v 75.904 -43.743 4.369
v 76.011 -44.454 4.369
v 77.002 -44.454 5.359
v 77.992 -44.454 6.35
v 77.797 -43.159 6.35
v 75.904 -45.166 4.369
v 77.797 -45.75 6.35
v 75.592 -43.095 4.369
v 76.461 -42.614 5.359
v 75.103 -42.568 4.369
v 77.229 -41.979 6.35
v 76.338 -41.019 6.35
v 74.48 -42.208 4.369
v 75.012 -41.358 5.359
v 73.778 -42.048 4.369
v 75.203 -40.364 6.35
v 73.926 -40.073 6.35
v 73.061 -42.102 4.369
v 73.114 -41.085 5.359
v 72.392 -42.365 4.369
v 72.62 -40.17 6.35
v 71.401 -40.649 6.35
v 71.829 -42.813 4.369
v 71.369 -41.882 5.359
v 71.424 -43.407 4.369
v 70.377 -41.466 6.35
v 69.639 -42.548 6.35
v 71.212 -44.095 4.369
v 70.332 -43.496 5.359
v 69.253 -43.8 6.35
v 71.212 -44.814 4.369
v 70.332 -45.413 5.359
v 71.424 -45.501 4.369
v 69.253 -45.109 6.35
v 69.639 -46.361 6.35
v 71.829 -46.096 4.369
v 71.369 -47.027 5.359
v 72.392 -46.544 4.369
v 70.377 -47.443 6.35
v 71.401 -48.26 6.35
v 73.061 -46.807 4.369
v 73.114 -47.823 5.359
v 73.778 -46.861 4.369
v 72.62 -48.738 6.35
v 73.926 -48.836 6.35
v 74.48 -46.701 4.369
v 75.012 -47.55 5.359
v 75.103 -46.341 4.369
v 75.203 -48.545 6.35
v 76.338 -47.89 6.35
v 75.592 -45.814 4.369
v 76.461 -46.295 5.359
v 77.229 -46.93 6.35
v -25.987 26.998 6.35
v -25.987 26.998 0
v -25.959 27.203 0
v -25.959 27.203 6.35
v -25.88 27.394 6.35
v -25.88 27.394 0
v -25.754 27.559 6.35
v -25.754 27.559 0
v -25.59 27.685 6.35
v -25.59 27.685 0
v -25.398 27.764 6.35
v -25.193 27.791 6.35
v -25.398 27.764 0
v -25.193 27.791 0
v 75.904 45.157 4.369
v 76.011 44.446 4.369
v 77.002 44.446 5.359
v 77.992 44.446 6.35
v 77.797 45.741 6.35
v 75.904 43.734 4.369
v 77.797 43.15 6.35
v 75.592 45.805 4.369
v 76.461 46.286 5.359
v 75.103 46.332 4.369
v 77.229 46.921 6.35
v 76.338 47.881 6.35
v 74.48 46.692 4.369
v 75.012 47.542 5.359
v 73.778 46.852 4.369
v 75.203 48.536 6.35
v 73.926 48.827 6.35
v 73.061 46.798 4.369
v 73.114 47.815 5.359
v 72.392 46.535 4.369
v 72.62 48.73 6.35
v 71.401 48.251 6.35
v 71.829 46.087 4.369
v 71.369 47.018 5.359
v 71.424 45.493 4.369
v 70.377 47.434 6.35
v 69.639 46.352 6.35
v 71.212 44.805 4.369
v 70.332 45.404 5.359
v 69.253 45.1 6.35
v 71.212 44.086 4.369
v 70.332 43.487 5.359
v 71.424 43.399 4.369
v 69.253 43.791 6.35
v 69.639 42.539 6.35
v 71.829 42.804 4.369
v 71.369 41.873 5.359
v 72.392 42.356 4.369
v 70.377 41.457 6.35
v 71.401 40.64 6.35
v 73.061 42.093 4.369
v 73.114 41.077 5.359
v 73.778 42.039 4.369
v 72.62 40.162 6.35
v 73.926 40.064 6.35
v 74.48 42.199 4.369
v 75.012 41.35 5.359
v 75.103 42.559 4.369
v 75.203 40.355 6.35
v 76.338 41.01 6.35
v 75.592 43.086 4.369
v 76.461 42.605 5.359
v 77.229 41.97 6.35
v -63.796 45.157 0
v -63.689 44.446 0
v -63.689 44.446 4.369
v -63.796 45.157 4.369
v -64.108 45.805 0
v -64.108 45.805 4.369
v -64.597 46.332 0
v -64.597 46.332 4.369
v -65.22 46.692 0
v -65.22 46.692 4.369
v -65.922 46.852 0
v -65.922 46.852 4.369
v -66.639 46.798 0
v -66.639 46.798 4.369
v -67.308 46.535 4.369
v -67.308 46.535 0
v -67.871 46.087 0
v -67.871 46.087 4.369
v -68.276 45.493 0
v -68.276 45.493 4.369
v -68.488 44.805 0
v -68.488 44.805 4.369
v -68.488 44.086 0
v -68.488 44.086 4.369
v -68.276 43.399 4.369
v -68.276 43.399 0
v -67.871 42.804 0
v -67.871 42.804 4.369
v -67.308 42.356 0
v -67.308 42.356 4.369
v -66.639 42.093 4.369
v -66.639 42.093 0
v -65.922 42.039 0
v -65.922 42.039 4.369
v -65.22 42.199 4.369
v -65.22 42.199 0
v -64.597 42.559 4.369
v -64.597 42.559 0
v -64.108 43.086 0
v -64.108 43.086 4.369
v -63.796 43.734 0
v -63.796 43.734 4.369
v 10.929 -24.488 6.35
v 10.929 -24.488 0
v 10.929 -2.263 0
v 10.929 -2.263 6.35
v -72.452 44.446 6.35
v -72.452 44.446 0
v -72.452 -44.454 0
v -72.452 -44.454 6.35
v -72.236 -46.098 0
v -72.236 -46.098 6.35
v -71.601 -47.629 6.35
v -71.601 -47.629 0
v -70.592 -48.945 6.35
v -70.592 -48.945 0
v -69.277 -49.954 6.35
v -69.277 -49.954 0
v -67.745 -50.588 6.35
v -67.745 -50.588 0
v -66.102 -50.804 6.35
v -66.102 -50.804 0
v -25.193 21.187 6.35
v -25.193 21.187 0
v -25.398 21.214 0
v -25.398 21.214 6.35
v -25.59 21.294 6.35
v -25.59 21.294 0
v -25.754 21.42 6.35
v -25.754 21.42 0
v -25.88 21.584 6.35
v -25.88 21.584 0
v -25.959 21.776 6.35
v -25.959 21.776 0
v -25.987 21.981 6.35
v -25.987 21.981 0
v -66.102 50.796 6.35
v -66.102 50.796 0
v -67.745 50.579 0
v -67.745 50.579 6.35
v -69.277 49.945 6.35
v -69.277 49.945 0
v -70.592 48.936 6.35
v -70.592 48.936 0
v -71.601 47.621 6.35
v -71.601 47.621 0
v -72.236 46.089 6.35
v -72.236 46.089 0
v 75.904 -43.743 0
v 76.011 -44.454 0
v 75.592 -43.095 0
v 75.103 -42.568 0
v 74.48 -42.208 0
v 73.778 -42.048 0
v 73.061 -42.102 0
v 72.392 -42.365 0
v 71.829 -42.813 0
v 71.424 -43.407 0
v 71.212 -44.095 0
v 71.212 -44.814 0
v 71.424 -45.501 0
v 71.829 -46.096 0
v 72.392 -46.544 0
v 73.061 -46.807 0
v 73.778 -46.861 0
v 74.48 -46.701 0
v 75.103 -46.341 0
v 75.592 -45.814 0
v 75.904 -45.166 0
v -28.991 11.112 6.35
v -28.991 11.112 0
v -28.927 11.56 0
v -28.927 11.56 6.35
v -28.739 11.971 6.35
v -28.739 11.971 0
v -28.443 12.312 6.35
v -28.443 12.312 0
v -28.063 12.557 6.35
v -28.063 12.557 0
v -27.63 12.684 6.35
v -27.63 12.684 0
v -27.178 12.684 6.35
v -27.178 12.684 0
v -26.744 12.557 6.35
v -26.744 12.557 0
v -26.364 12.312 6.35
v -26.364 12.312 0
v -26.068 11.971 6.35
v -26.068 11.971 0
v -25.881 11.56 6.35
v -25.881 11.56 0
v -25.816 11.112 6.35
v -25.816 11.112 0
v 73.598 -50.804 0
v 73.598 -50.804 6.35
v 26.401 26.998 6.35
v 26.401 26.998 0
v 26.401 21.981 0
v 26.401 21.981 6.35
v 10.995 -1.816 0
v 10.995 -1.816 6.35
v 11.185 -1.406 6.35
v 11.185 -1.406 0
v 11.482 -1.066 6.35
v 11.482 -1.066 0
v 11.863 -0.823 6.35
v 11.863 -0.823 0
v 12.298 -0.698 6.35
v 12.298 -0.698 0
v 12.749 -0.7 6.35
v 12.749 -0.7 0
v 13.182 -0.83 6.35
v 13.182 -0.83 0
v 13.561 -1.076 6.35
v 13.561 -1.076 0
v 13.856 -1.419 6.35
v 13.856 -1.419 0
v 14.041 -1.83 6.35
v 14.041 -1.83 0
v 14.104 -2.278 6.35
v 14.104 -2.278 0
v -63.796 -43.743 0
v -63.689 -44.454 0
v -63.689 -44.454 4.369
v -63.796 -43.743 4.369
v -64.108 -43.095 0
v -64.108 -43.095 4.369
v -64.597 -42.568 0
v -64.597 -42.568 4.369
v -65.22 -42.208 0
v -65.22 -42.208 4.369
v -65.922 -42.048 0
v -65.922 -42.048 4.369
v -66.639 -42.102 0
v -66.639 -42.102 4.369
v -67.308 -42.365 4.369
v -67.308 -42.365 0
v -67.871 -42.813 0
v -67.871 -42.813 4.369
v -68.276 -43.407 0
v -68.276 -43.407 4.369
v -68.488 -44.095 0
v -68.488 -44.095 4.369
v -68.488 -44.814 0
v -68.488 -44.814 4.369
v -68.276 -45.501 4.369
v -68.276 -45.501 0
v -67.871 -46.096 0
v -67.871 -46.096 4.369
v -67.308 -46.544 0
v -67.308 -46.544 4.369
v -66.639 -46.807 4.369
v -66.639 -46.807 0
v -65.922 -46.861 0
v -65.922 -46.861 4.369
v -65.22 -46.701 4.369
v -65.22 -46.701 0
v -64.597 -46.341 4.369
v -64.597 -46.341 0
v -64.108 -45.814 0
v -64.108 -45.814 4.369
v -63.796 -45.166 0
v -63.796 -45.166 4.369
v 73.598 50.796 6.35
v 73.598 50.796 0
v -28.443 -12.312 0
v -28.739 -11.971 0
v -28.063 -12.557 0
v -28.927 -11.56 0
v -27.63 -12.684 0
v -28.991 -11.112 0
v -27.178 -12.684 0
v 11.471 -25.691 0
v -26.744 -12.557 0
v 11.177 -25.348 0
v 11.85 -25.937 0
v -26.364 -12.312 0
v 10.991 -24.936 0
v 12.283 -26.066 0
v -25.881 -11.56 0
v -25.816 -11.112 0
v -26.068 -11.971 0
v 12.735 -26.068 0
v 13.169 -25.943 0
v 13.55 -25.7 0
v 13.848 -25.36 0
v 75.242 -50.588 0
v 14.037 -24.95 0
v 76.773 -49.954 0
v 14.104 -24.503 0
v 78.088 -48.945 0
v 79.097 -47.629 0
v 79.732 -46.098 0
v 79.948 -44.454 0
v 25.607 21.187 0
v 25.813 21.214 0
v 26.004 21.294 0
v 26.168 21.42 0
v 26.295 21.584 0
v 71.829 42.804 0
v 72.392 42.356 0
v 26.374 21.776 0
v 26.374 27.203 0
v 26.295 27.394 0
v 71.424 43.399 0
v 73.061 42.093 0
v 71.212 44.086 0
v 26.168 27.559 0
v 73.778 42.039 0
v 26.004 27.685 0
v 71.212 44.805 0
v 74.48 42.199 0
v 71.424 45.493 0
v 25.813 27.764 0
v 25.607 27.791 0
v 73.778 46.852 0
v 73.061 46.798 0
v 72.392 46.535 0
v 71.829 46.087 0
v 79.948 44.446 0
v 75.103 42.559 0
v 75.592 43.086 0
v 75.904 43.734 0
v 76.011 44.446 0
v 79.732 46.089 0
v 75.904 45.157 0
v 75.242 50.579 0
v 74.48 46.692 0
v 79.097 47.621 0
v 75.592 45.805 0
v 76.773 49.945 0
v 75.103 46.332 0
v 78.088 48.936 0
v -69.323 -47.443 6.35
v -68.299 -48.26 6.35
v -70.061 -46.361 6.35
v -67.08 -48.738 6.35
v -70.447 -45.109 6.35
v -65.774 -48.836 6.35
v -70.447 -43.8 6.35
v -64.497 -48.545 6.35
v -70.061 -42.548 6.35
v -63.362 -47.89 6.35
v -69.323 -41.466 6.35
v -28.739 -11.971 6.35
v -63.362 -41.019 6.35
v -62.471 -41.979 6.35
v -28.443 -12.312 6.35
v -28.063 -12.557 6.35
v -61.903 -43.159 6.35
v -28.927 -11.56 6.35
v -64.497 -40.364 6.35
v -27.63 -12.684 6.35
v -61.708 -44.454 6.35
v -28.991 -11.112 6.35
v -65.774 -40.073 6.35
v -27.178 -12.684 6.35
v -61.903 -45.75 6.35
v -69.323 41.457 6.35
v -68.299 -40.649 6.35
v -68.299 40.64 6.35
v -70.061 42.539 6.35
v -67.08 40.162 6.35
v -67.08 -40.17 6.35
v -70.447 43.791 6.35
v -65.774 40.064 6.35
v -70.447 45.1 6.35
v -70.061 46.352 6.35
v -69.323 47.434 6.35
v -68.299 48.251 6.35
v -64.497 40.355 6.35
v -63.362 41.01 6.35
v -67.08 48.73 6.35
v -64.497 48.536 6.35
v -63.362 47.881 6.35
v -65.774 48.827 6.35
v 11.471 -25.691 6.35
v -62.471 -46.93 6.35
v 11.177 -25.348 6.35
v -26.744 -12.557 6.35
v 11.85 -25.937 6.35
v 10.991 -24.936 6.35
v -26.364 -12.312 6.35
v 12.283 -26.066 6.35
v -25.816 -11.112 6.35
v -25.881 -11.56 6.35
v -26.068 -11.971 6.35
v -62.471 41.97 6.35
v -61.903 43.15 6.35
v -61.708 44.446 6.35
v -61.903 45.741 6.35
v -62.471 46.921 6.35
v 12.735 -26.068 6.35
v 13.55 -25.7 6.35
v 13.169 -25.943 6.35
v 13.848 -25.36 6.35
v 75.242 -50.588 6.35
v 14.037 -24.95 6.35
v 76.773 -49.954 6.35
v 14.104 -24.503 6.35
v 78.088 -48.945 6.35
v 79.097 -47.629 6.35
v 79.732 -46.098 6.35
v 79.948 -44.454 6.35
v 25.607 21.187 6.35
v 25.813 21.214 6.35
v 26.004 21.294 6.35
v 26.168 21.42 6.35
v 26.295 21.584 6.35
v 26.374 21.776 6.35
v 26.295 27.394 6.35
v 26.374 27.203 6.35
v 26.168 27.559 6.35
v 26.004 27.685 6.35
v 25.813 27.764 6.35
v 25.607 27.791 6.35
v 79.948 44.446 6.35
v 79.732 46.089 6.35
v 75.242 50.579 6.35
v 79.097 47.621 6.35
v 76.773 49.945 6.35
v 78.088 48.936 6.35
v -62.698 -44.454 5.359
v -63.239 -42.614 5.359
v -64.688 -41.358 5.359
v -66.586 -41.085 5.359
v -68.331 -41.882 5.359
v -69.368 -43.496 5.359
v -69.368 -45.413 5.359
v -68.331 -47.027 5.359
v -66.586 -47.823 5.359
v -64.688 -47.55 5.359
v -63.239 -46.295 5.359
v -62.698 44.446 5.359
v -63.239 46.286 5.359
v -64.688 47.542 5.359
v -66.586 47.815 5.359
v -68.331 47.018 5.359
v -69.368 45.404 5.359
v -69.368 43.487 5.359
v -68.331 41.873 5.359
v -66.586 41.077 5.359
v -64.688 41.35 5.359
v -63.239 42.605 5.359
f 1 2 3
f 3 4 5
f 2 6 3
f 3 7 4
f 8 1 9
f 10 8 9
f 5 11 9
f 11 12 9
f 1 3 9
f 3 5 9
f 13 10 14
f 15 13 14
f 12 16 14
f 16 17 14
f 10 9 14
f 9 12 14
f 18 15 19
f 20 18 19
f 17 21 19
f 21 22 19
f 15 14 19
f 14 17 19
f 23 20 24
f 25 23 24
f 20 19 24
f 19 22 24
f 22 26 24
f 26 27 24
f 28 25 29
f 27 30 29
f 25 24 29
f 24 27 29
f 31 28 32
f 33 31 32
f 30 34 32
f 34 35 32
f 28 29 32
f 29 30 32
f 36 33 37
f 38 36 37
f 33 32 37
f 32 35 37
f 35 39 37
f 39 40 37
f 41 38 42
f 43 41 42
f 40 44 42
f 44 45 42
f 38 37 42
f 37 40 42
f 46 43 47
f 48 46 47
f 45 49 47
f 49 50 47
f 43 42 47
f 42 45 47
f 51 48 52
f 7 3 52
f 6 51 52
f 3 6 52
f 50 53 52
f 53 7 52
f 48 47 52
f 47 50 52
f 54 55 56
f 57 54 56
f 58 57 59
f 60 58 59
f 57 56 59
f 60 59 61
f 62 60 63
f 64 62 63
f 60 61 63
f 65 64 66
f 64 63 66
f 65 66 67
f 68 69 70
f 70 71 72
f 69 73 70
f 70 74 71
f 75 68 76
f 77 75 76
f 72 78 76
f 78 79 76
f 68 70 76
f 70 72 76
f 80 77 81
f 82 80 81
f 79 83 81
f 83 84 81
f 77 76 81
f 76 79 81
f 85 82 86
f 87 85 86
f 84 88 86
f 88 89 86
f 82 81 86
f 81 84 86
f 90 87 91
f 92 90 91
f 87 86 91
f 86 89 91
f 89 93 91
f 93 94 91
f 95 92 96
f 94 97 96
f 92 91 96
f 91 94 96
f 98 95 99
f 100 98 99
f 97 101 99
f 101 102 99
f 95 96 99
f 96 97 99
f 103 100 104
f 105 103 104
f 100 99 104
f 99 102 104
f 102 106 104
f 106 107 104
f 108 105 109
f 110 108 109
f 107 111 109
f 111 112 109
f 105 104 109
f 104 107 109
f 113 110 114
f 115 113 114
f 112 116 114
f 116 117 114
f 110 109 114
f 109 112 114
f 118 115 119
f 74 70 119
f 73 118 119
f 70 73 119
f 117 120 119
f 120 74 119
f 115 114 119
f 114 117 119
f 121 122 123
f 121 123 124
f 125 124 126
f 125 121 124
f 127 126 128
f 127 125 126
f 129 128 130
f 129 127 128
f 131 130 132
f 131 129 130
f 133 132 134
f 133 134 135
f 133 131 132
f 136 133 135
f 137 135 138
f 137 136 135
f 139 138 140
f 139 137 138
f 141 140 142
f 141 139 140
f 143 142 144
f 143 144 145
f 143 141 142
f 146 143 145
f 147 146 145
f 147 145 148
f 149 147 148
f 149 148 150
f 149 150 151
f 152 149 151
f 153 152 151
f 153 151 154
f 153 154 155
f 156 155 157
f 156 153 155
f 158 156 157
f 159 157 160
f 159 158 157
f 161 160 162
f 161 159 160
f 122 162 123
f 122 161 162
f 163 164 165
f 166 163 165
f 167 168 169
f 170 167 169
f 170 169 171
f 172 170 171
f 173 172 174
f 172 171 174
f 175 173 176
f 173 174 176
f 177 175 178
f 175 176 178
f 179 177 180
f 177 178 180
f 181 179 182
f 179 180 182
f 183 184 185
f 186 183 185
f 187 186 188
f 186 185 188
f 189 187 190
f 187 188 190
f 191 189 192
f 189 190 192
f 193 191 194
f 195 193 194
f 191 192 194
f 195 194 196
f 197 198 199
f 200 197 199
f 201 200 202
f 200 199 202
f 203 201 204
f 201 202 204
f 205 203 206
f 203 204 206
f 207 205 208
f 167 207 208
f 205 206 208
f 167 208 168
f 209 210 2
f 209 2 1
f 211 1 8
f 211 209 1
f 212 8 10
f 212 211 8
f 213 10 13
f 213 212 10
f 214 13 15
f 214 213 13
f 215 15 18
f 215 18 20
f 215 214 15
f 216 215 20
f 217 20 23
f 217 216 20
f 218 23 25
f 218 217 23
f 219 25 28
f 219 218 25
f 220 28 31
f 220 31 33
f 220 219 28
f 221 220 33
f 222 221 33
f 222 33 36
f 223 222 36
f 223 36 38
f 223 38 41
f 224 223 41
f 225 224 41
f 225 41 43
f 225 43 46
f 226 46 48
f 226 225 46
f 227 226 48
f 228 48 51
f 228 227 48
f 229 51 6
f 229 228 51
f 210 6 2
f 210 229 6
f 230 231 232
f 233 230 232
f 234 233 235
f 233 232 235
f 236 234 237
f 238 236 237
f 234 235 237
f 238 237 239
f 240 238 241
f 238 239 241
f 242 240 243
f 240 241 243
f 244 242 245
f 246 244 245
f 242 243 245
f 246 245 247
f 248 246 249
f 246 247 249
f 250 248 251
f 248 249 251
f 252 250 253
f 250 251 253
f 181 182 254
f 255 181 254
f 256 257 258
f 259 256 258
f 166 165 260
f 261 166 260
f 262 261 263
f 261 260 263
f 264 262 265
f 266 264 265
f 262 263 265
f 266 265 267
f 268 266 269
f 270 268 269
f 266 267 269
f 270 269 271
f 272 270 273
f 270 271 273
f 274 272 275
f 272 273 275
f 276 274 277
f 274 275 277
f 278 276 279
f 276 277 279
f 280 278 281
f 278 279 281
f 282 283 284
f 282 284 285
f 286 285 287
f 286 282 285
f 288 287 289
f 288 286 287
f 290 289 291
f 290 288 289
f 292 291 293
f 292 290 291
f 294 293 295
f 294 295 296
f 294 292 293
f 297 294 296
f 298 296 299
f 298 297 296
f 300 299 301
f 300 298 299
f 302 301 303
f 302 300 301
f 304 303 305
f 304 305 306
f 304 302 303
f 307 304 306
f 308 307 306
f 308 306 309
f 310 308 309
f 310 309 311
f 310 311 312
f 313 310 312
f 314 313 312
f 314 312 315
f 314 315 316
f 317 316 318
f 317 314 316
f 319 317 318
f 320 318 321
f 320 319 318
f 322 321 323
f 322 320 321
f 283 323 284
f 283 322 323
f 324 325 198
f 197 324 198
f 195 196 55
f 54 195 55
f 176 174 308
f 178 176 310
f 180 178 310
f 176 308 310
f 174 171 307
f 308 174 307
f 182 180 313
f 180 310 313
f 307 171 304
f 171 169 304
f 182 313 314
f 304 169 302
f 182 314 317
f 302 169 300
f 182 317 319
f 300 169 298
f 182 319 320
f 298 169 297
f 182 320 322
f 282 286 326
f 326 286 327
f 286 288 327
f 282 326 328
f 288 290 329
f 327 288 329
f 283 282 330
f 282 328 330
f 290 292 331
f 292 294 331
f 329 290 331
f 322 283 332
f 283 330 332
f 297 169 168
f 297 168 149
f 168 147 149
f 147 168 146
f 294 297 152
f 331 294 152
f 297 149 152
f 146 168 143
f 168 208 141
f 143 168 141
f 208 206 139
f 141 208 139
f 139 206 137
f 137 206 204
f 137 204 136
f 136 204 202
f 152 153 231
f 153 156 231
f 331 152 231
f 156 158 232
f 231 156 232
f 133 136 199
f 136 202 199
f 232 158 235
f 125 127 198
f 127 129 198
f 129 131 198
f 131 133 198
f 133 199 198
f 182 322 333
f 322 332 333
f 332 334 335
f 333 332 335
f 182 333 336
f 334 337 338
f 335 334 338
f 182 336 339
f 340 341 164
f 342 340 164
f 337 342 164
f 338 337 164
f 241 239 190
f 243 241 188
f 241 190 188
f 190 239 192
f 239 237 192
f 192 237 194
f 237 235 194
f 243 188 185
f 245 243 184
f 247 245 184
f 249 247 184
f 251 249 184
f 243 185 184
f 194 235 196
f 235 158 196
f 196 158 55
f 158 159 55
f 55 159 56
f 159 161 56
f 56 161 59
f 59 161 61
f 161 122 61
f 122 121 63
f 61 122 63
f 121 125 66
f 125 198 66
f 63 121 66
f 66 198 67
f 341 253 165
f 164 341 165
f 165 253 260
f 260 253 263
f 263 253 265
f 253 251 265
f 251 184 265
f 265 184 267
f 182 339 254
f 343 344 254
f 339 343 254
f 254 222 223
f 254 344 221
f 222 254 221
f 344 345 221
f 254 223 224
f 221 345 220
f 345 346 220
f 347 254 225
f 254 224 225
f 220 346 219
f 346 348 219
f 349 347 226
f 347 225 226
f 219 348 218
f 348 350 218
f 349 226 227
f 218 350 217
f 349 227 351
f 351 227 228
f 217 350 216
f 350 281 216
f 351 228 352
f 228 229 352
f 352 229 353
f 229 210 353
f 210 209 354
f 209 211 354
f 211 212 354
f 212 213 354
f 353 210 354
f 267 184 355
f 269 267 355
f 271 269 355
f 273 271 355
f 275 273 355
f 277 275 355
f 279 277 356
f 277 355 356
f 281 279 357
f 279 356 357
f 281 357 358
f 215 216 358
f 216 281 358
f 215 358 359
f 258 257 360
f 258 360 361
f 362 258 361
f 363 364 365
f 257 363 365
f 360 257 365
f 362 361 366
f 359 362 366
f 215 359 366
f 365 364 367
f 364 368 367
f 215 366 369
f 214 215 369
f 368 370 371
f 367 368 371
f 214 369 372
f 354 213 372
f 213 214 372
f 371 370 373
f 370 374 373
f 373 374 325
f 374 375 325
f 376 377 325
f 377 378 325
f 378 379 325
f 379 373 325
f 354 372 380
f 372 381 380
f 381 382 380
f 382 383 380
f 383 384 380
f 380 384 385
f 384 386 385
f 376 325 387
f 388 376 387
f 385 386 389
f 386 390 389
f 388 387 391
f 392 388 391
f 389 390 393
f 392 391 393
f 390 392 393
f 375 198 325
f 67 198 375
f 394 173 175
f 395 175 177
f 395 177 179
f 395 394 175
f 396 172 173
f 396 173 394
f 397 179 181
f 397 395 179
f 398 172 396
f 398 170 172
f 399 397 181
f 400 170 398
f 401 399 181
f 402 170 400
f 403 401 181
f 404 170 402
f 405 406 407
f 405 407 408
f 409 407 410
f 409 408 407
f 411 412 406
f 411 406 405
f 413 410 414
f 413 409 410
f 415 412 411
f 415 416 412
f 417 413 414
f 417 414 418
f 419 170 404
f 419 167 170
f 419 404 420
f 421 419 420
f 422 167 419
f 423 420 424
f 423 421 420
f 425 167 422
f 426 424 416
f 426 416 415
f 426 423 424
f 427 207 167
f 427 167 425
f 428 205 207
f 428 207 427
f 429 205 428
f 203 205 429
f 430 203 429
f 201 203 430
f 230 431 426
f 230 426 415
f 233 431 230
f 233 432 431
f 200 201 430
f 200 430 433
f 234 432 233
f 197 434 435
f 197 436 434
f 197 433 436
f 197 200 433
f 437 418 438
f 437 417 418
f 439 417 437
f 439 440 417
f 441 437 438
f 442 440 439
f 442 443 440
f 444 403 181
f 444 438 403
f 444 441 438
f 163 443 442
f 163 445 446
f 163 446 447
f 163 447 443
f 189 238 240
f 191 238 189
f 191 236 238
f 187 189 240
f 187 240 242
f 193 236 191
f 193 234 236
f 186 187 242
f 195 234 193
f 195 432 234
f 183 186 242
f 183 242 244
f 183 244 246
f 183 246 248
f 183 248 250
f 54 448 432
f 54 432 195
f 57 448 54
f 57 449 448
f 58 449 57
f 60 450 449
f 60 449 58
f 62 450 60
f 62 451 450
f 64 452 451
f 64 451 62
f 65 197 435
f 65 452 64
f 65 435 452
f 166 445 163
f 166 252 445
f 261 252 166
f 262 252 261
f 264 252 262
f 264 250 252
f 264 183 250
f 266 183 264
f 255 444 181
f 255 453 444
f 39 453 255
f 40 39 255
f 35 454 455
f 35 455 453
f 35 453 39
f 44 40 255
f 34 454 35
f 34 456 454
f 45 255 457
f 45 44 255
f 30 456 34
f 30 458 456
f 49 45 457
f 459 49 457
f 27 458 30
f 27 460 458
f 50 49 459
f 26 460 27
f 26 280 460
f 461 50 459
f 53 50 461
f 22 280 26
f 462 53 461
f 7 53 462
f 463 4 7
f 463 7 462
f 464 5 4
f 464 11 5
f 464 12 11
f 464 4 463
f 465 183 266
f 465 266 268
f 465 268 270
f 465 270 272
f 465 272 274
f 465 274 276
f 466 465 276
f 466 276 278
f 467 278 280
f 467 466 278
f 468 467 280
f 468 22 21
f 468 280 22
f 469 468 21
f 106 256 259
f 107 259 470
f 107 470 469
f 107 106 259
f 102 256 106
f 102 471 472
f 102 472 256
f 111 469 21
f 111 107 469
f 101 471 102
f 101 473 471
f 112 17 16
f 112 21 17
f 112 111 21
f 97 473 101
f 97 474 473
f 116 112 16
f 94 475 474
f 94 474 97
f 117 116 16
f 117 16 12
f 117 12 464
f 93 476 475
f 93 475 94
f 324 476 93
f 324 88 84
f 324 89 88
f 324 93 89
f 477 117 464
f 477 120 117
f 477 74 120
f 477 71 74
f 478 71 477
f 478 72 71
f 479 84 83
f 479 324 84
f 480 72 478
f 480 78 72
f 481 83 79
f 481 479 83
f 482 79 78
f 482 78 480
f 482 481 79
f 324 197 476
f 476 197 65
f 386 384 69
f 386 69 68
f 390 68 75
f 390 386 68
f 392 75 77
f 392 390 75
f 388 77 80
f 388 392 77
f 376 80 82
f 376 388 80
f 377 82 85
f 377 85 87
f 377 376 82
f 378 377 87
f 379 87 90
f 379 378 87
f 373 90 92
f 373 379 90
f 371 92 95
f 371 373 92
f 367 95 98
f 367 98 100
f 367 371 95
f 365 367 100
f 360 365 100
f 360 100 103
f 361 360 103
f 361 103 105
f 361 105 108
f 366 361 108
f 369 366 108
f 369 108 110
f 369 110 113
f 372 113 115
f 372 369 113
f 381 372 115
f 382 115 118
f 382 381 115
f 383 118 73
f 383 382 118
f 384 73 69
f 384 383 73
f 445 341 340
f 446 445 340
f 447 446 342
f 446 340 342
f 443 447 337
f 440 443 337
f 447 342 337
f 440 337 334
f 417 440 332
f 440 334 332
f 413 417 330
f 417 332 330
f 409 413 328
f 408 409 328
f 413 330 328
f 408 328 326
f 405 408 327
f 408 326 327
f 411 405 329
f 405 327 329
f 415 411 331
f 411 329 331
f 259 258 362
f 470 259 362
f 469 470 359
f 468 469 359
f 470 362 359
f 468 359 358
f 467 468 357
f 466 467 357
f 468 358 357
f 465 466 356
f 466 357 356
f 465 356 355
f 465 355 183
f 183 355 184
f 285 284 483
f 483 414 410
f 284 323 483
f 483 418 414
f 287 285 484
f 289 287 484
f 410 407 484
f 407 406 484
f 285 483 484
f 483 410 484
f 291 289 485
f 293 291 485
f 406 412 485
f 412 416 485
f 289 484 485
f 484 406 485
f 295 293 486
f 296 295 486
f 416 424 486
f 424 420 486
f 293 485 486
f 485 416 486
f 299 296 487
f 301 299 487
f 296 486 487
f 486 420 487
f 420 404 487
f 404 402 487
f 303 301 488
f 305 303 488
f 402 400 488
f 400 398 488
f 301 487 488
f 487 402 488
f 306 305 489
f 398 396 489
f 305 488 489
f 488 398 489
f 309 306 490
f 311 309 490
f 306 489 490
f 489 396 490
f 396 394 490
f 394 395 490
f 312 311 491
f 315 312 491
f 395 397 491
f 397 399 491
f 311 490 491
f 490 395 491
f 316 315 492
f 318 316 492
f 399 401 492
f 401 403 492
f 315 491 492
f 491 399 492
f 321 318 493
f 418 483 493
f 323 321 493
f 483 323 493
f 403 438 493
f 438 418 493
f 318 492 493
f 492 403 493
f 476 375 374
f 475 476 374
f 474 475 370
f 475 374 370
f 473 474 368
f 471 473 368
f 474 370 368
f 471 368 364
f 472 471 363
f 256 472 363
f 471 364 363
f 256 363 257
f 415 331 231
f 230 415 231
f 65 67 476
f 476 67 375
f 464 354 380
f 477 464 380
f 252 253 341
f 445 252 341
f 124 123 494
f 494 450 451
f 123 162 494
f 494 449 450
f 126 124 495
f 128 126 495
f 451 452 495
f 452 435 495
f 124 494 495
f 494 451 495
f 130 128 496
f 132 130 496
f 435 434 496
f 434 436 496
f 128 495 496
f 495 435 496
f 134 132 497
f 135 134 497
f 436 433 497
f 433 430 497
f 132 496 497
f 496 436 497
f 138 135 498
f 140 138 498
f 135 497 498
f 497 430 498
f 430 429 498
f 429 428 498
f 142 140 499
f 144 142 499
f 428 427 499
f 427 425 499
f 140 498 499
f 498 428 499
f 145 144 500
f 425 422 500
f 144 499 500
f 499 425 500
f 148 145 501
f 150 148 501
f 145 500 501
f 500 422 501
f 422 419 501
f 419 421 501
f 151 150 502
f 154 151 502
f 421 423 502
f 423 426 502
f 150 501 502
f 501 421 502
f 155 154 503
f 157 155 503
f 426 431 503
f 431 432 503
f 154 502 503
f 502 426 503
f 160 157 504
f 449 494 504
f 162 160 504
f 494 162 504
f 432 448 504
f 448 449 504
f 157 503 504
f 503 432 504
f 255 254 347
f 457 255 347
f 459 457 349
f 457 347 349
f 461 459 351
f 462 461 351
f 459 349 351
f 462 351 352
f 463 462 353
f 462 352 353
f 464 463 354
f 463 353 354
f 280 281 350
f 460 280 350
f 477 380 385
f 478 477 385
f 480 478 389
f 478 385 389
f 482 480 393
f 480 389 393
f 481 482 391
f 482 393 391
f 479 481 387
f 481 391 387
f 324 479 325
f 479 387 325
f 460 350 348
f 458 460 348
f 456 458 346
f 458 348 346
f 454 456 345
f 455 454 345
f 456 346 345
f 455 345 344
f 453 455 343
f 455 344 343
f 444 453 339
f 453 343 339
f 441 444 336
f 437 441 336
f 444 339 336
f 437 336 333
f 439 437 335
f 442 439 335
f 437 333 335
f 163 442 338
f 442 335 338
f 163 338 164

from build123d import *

# Parameters (mm, degrees)
F0_R     = 2.413
F1_DEPTH = 6.35
F2_SIZE  = 1.9812


with BuildPart() as f1:
    # F0 (on Top) → F1 (new body)
    with BuildSketch(Plane.XY):
        with BuildLine():
            ThreePointArc((-72.451897, -44.454429), (-70.592025, -48.944557), (-66.101897, -50.804429))
            Line((-66.101897, -50.804429), (73.598103, -50.804429))
            ThreePointArc((73.598103, -50.804429), (78.088231, -48.944557), (79.948103, -44.454429))
            Line((79.948103, -44.454429), (79.948103, 44.445571))
            ThreePointArc((79.948103, 44.445571), (78.088231, 48.935699), (73.598103, 50.795571))
            Line((73.598103, 50.795571), (-66.101897, 50.795571))
            ThreePointArc((-66.101897, 50.795571), (-70.592025, 48.935699), (-72.451897, 44.445571))
            Line((-72.451897, 44.445571), (-72.451897, -44.454429))
        make_face()
        with Locations((-66.101897, -44.454429)):
            Circle(F0_R, mode=Mode.SUBTRACT)
        with Locations((73.598103, -44.454429)):
            Circle(F0_R, mode=Mode.SUBTRACT)
        with BuildLine():
            ThreePointArc((10.928676, -2.263215), (12.523538, -0.683077), (14.103676, -2.27794))
            Line((14.103676, -2.27794), (14.103676, -24.50294))
            ThreePointArc((14.103676, -24.50294), (12.508813, -26.083077), (10.928676, -24.488215))
            Line((10.928676, -24.488215), (10.928676, -2.263215))
        make_face(mode=Mode.SUBTRACT)
        with BuildLine():
            ThreePointArc((-28.991299, 11.1125), (-27.403799, 12.7), (-25.816299, 11.1125))
            Line((-25.816299, 11.1125), (-25.816299, -11.1125))
            ThreePointArc((-25.816299, -11.1125), (-27.403799, -12.7), (-28.991299, -11.1125))
            Line((-28.991299, -11.1125), (-28.991299, 11.1125))
        make_face(mode=Mode.SUBTRACT)
        with BuildLine():
            ThreePointArc((-25.986542, 26.997524), (-25.754058, 27.55879), (-25.192792, 27.791274))
            Line((-25.192792, 27.791274), (25.607208, 27.791274))
            ThreePointArc((25.607208, 27.791274), (26.168474, 27.55879), (26.400958, 26.997524))
            Line((26.400958, 26.997524), (26.400958, 21.981024))
            ThreePointArc((26.400958, 21.981024), (26.168474, 21.419758), (25.607208, 21.187274))
            Line((25.607208, 21.187274), (-25.192792, 21.187274))
            ThreePointArc((-25.192792, 21.187274), (-25.754058, 21.419758), (-25.986542, 21.981024))
            Line((-25.986542, 21.981024), (-25.986542, 26.997524))
        make_face(mode=Mode.SUBTRACT)
        with Locations((-66.101897, 44.445571)):
            Circle(F0_R, mode=Mode.SUBTRACT)
        with Locations((73.598103, 44.445571)):
            Circle(F0_R, mode=Mode.SUBTRACT)
    extrude(amount=F1_DEPTH)

    # F2
    f2_edges = [f1.edges().sort_by_distance(p)[0] for p in [
        (-68.514897, -44.454429, 6.35),
        (71.185103, -44.454429, 6.35),
        (71.185103, 44.445571, 6.35),
        (-68.514897, 44.445571, 6.35),
    ]]
    chamfer(f2_edges, length=F2_SIZE)


solid = f1.part
